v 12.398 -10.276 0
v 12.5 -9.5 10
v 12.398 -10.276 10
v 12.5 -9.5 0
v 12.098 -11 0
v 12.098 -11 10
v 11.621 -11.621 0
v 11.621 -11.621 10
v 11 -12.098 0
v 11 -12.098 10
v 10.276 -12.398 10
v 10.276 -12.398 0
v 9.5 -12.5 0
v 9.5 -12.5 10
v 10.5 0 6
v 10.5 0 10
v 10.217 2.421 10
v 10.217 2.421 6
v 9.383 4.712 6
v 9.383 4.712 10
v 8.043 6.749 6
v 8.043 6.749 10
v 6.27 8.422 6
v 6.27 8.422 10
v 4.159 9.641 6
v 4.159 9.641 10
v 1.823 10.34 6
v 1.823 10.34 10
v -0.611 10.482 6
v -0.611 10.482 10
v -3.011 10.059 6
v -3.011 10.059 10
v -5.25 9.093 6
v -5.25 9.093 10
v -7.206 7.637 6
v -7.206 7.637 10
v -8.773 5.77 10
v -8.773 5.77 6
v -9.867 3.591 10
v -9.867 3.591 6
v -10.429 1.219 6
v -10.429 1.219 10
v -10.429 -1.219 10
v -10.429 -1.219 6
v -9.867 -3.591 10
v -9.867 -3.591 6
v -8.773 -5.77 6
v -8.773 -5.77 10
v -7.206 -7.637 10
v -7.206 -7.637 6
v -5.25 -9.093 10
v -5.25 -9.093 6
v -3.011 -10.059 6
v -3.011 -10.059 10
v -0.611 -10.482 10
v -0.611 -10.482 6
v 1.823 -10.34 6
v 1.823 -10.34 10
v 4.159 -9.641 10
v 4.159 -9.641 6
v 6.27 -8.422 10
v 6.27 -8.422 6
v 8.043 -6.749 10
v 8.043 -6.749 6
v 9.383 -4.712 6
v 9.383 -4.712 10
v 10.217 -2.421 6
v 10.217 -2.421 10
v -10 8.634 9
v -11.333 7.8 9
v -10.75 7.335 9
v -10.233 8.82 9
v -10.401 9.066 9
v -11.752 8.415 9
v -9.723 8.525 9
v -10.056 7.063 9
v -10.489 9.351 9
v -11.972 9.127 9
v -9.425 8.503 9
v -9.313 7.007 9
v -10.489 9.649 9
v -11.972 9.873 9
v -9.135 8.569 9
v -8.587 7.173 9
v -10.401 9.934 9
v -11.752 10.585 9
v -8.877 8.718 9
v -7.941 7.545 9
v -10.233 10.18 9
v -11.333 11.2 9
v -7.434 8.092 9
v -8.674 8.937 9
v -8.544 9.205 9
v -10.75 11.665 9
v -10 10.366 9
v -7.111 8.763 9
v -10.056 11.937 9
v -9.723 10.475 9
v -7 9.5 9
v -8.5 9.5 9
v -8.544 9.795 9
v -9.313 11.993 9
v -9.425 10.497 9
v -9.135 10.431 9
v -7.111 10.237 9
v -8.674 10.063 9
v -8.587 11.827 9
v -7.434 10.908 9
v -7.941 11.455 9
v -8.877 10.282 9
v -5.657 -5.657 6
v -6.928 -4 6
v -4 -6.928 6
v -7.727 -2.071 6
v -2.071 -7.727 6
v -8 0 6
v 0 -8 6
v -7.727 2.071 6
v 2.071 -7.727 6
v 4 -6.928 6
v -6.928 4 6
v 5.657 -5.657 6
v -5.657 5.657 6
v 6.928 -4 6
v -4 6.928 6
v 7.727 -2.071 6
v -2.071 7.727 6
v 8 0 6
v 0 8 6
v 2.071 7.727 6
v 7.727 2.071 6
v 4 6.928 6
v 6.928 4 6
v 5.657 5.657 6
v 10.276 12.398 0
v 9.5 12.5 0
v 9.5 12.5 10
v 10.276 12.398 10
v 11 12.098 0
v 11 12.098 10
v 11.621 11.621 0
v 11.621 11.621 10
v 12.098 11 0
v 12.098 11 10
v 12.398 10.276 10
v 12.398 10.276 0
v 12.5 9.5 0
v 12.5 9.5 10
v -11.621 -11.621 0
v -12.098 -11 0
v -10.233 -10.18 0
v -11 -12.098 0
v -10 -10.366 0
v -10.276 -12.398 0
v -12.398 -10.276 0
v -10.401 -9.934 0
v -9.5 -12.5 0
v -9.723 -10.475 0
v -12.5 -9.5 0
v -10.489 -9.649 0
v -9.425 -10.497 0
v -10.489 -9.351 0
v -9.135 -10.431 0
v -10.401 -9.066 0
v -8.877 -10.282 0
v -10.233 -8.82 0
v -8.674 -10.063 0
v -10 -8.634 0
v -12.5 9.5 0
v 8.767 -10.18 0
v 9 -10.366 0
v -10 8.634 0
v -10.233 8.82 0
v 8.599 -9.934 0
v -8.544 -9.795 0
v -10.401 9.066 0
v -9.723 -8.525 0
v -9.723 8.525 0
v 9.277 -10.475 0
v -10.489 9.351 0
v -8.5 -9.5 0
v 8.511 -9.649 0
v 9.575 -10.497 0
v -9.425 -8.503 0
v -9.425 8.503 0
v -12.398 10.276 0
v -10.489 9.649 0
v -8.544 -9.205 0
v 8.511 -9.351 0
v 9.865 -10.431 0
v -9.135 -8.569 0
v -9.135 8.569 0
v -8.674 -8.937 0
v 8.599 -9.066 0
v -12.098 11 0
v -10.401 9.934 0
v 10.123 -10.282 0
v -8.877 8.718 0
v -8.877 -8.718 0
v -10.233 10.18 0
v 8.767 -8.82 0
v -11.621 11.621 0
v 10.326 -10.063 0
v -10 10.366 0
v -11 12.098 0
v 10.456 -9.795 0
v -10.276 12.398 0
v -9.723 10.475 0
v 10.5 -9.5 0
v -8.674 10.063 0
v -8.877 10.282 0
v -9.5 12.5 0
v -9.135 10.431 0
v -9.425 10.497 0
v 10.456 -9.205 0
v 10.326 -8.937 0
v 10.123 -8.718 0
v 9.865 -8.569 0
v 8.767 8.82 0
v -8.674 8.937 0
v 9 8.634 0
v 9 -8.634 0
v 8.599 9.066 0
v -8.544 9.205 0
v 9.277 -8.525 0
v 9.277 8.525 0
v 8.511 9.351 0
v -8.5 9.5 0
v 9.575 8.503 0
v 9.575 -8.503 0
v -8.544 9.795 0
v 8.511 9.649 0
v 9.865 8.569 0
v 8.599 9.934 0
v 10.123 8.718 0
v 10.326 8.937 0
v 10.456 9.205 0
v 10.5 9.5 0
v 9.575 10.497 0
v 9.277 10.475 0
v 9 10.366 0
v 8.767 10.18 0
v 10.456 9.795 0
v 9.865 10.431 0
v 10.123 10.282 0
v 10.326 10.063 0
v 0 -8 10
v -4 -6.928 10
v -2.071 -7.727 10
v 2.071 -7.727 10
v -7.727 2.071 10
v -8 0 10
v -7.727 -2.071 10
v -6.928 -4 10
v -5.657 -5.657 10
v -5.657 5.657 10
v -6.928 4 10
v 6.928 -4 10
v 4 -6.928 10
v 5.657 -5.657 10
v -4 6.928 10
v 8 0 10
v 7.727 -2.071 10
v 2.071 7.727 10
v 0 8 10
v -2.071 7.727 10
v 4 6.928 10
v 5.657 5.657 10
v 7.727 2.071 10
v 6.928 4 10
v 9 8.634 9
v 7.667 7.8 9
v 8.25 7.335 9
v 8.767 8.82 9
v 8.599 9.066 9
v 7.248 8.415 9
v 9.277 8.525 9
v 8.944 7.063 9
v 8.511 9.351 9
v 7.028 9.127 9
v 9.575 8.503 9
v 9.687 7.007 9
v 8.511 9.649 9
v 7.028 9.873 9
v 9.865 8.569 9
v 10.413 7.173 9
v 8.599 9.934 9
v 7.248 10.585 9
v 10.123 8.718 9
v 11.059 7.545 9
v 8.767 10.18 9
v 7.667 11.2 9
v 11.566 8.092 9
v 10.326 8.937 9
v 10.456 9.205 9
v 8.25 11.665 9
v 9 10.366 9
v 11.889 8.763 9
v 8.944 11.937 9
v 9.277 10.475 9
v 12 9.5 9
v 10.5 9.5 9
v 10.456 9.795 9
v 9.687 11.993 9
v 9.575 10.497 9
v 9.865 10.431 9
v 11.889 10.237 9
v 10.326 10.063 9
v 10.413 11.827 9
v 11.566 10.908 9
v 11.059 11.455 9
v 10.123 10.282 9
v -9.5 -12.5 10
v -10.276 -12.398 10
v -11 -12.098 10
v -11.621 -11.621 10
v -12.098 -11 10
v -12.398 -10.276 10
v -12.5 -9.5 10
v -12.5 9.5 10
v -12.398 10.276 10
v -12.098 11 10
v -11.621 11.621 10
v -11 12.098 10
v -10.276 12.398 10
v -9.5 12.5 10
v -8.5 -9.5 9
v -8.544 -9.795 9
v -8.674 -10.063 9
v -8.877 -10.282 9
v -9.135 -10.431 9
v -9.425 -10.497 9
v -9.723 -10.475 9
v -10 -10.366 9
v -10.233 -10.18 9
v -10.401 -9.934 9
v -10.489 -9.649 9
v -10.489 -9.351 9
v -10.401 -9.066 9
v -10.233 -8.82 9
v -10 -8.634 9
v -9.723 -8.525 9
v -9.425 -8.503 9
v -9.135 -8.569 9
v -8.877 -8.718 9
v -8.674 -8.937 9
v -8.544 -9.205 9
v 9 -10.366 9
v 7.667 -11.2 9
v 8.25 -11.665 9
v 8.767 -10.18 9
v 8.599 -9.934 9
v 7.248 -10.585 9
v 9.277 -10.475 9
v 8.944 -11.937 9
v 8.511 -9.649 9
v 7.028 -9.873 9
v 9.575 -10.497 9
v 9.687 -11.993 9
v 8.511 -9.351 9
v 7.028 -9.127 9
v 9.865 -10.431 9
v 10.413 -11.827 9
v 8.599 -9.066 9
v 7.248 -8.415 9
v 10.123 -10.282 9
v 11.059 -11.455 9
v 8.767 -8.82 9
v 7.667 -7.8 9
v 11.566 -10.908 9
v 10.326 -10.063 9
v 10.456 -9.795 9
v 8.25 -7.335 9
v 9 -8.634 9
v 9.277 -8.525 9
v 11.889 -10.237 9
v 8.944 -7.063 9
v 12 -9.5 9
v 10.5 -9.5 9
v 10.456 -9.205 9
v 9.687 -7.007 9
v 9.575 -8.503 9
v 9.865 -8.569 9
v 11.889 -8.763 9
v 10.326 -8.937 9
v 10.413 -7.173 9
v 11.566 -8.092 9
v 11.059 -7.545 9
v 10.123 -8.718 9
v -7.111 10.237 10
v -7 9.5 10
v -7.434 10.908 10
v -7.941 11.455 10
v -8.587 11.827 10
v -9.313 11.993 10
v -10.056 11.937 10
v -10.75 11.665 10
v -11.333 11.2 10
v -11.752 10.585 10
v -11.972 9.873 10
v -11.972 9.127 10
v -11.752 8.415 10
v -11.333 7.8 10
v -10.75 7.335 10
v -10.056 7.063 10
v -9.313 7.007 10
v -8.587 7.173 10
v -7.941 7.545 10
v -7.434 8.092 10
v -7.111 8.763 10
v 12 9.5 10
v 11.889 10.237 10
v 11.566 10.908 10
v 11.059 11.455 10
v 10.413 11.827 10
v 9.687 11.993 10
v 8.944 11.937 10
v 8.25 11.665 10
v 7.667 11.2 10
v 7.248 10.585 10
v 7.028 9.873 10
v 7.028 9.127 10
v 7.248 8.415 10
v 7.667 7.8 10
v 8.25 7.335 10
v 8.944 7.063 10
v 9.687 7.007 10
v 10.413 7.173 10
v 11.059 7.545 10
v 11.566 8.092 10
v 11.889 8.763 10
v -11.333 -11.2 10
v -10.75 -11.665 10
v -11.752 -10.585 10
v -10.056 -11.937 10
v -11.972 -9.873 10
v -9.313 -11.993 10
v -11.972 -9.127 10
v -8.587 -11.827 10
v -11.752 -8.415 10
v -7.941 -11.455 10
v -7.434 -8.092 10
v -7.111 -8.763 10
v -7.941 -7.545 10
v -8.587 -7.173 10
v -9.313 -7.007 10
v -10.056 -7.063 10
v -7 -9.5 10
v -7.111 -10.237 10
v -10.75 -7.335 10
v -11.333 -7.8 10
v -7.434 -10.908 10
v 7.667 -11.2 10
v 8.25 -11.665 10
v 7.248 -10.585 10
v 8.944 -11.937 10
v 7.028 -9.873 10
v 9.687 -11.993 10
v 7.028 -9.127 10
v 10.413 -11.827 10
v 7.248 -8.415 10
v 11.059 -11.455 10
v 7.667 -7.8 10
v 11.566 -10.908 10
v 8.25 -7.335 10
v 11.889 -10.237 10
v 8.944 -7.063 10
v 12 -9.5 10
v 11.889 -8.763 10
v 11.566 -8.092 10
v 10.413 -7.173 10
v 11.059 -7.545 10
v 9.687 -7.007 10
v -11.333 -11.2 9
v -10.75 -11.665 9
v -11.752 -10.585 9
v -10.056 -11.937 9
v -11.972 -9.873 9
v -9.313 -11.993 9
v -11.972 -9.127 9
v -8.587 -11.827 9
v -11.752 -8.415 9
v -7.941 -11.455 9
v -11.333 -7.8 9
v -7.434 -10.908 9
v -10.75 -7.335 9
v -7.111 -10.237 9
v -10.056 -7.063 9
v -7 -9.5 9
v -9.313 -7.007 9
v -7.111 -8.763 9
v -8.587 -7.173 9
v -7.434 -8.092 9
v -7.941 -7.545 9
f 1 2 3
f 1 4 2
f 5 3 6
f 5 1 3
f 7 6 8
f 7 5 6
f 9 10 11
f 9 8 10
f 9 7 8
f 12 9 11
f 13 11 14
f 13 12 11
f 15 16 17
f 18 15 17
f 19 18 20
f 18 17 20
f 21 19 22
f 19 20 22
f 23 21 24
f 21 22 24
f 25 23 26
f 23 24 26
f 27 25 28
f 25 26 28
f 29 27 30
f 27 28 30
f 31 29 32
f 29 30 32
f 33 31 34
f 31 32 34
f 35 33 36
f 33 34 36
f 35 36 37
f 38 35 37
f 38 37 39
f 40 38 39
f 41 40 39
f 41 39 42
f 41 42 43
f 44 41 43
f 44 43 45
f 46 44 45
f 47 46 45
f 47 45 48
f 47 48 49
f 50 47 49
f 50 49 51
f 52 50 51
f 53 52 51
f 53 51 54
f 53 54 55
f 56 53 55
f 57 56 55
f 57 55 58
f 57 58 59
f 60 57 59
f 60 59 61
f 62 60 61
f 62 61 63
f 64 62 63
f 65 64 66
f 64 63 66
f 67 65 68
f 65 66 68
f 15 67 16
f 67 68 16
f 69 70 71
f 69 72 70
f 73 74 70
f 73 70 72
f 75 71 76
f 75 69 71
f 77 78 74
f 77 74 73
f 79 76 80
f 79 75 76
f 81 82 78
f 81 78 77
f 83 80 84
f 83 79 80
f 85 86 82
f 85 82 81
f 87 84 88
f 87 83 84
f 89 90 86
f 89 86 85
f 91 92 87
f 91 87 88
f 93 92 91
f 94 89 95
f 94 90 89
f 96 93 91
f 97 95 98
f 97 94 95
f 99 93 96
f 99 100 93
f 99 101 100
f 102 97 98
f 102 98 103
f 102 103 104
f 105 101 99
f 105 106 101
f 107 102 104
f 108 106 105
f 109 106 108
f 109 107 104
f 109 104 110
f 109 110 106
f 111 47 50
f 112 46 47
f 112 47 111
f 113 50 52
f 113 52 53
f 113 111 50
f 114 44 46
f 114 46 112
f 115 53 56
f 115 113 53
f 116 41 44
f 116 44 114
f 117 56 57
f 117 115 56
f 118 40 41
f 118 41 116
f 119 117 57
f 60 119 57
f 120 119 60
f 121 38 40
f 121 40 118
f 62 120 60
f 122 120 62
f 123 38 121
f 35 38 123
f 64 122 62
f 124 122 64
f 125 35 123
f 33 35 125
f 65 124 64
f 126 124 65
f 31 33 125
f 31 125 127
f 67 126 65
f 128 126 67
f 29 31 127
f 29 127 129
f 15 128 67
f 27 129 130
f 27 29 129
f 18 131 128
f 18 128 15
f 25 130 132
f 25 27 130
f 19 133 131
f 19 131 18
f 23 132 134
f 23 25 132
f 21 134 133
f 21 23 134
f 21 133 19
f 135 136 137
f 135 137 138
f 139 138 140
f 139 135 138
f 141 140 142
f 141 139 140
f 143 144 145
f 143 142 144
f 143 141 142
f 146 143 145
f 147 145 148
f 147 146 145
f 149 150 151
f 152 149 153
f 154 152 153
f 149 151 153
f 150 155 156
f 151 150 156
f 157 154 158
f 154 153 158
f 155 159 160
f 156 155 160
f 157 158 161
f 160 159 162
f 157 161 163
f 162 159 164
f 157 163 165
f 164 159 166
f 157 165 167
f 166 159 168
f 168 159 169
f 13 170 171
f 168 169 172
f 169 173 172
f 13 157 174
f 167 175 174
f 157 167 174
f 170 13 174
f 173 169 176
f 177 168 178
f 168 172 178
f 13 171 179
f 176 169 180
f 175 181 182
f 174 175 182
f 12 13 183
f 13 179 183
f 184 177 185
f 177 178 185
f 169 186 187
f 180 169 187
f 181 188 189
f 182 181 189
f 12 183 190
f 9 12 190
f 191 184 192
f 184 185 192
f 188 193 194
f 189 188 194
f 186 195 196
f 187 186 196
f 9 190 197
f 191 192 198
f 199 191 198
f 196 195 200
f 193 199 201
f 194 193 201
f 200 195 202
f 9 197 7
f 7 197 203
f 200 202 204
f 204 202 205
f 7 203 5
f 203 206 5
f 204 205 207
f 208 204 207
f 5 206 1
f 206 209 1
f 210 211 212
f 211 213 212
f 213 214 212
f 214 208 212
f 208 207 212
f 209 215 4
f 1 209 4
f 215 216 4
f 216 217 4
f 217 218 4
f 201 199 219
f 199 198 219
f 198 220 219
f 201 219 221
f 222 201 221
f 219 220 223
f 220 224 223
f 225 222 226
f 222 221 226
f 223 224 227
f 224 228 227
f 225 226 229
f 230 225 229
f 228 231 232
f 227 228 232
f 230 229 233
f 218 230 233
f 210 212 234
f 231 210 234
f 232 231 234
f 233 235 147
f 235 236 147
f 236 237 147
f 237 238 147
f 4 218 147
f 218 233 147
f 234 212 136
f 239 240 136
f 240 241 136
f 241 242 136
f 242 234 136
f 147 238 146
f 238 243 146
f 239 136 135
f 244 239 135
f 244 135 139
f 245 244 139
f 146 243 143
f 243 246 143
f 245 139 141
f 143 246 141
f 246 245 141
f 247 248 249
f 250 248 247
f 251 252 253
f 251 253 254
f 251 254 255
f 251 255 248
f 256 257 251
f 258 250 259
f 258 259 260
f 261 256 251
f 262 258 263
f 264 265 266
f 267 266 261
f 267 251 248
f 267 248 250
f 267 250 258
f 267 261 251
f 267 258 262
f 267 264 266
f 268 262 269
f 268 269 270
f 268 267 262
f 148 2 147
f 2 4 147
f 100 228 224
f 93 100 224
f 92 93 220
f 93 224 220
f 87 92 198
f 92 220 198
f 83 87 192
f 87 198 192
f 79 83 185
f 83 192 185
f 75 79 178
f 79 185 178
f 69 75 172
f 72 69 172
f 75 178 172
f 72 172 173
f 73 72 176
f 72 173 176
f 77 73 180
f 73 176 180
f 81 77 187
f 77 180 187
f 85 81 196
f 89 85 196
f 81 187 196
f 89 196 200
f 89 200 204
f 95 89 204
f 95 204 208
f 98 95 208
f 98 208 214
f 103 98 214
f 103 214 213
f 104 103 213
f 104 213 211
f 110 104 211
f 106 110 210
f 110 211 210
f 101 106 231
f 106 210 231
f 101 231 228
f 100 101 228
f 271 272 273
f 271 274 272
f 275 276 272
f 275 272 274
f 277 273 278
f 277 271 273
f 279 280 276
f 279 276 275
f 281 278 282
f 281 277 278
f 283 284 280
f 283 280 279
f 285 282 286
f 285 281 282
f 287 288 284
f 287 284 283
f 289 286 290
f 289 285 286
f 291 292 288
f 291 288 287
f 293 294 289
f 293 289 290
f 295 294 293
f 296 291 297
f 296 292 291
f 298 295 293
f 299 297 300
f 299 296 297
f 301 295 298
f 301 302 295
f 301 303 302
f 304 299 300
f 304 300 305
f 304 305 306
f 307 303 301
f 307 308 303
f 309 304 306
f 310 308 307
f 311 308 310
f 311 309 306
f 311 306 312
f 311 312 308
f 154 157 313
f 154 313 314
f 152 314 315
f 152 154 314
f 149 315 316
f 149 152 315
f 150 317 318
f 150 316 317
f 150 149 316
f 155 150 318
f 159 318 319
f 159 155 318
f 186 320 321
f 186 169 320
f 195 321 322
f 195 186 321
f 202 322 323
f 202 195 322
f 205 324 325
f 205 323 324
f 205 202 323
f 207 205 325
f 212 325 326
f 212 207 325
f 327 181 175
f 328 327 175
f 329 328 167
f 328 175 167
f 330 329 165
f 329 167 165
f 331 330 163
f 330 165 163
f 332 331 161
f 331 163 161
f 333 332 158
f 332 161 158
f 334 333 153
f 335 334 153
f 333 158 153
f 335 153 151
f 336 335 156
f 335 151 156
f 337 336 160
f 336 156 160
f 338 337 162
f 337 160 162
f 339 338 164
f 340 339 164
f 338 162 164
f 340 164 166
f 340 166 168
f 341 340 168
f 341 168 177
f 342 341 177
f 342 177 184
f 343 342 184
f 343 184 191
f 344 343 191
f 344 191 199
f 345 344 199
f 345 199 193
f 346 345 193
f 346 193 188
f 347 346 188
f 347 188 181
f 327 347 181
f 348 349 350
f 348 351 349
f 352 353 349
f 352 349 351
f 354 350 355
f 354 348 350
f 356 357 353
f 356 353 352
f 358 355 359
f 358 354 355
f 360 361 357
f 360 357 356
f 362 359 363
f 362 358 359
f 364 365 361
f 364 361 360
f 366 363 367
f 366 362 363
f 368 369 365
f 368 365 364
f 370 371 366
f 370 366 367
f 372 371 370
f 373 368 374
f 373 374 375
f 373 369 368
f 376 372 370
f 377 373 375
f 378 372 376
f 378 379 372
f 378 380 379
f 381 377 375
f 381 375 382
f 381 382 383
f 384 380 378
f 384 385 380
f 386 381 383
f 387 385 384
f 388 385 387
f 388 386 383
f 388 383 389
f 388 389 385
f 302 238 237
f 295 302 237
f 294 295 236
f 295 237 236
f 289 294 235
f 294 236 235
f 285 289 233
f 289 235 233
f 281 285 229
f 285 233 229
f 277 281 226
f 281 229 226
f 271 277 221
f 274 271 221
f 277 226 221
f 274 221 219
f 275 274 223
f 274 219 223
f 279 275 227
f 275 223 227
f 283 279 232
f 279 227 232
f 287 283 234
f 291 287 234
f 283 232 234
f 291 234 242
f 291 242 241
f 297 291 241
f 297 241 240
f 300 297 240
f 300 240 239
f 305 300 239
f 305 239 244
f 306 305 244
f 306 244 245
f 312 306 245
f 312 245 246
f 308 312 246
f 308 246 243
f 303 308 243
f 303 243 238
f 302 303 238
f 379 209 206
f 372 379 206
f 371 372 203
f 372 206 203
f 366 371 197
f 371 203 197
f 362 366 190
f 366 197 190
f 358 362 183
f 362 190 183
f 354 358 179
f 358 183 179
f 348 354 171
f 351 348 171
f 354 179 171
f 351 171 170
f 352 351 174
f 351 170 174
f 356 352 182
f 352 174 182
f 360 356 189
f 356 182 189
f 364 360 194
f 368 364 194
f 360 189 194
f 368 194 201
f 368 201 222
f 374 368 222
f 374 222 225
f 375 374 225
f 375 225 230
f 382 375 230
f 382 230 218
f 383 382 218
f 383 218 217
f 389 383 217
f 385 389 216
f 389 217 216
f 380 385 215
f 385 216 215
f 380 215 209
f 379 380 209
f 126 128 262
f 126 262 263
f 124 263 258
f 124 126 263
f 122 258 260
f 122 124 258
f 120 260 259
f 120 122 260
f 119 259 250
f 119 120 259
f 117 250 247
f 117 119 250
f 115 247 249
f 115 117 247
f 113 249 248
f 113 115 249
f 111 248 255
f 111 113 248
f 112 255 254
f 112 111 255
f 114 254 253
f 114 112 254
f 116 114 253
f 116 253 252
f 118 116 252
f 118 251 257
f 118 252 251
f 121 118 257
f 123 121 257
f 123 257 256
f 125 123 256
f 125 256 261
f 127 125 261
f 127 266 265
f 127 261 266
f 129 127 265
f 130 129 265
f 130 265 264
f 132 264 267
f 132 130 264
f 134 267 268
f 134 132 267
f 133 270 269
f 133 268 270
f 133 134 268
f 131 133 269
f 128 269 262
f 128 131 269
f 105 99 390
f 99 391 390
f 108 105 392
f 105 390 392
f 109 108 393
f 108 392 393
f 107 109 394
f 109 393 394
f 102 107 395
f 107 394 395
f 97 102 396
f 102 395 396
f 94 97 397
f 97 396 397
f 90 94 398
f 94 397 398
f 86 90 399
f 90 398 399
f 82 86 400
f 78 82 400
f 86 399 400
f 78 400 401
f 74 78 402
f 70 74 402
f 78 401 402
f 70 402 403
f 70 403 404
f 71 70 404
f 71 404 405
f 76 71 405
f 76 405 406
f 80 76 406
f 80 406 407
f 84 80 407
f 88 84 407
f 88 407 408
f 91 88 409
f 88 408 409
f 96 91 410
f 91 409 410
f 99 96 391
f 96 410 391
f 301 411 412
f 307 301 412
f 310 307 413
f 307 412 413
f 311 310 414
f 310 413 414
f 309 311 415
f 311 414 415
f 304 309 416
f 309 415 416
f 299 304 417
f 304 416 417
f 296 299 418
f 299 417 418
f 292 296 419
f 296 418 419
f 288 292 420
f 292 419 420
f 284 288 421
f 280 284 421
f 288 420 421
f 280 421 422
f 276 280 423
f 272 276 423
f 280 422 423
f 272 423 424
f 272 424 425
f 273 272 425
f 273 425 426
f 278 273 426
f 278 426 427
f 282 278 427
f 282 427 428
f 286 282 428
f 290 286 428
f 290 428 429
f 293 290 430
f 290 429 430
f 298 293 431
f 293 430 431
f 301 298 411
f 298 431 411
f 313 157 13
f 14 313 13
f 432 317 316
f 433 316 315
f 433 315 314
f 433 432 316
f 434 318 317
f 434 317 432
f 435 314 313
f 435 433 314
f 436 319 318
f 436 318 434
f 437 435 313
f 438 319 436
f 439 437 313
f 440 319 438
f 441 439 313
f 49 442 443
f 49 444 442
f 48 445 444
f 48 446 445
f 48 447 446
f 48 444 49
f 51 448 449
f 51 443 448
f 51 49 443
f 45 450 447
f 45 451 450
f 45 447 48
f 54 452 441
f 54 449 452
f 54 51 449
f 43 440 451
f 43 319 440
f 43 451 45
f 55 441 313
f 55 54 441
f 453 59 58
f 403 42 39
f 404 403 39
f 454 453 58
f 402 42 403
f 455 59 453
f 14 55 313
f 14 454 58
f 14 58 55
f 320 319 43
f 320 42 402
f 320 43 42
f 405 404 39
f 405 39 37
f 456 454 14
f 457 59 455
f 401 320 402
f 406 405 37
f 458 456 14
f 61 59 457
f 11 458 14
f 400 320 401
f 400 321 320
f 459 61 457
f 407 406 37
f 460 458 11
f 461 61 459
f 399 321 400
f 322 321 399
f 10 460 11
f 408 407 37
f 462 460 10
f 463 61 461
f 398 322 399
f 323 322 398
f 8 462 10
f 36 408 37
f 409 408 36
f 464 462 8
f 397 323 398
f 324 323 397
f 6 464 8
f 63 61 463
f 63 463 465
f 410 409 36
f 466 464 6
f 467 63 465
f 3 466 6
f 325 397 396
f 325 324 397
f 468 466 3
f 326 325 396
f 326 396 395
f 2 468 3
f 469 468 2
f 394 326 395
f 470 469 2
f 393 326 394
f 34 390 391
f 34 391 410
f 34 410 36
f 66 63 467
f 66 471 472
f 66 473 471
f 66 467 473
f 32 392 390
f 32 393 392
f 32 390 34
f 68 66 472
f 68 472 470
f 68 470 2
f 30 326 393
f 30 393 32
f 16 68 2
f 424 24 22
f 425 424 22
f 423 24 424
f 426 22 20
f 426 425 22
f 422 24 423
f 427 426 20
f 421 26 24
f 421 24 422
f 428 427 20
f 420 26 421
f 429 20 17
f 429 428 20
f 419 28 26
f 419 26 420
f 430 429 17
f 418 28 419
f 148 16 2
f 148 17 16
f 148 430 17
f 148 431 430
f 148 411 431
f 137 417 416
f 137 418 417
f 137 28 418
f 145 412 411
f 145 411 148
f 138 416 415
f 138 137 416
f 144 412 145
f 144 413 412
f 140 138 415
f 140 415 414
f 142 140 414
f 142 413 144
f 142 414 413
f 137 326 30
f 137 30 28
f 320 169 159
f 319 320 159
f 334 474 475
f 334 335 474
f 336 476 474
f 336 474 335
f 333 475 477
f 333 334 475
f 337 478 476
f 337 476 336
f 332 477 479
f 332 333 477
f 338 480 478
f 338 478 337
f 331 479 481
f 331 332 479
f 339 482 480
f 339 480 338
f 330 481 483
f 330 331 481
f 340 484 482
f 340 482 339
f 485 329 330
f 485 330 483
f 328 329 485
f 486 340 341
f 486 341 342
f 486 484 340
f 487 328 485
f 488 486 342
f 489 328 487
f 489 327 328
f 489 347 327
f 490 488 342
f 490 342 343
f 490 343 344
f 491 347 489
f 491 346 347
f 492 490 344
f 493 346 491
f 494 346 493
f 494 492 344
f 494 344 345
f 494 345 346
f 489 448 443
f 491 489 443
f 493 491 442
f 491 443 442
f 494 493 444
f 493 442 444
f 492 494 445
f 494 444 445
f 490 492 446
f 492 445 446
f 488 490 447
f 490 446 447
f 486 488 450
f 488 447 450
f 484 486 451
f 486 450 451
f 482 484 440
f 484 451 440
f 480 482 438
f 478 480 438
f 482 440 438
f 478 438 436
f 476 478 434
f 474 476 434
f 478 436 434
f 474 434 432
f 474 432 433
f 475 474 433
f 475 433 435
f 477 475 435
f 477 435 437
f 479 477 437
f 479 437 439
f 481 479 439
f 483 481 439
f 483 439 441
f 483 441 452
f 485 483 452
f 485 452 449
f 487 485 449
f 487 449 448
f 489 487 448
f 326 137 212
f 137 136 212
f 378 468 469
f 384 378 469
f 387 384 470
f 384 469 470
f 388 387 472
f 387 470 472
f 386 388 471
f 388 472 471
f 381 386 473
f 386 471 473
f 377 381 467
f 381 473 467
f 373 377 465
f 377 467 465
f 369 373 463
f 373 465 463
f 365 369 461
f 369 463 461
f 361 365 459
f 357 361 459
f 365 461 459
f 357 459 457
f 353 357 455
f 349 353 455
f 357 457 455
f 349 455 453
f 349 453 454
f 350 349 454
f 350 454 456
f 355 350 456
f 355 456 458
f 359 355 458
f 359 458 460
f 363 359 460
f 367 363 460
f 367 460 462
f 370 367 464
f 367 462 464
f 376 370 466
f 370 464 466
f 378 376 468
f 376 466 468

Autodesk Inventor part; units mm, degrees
ref_plane "YZ Plane" through (0, 0, 0) normal (1, 0, 0) x (0, 1, 0)
ref_plane "XZ Plane" through (0, 0, 0) normal (0, 1, 0) x (-1, 0, 0)
ref_plane "XY Plane" through (0, 0, 0) normal (0, 0, 1) x (1, 0, 0)
sketch "Sketch1" plane through (0, 0, 0) normal (0, 0, 1) x (1, 0, 0)
  circle A0 centre (9.5, 9.5) radius 1 projected
  arc A1 (12.2, 7.5) -> (12.5, 7.8) centre (12.2, 7.8) ccw projected
  line L0 (12.5, 7.8) -> (12.5, 12.2) projected
  arc A2 (12.5, 12.2) -> (12.2, 12.5) centre (12.2, 12.2) ccw projected
  line L1 (12.2, 12.5) -> (7.8, 12.5) projected
  arc A3 (7.8, 12.5) -> (7.5, 12.2) centre (7.8, 12.2) ccw projected
  line L2 (7.5, 12.2) -> (7.5, 7.8) projected
  arc A4 (7.5, 7.8) -> (7.8, 7.5) centre (7.8, 7.8) ccw projected
  line L3 (7.8, 7.5) -> (12.2, 7.5) projected
  circle A5 centre (9.5, -9.5) radius 1 projected
  arc A6 (12.5, -7.8) -> (12.2, -7.5) centre (12.2, -7.8) ccw projected
  line L4 (12.2, -7.5) -> (7.8, -7.5) projected
  arc A7 (7.8, -7.5) -> (7.5, -7.8) centre (7.8, -7.8) ccw projected
  line L5 (7.5, -7.8) -> (7.5, -12.2) projected
  arc A8 (7.5, -12.2) -> (7.8, -12.5) centre (7.8, -12.2) ccw projected
  line L6 (7.8, -12.5) -> (12.2, -12.5) projected
  arc A9 (12.2, -12.5) -> (12.5, -12.2) centre (12.2, -12.2) ccw projected
  line L7 (12.5, -12.2) -> (12.5, -7.8) projected
  circle A10 centre (-9.5, -9.5) radius 1 projected
  arc A11 (-12.2, -7.5) -> (-12.5, -7.8) centre (-12.2, -7.8) ccw projected
  line L8 (-12.5, -7.8) -> (-12.5, -12.2) projected
  arc A12 (-12.5, -12.2) -> (-12.2, -12.5) centre (-12.2, -12.2) ccw projected
  line L9 (-12.2, -12.5) -> (-7.8, -12.5) projected
  arc A13 (-7.8, -12.5) -> (-7.5, -12.2) centre (-7.8, -12.2) ccw projected
  line L10 (-7.5, -12.2) -> (-7.5, -7.8) projected
  arc A14 (-7.5, -7.8) -> (-7.8, -7.5) centre (-7.8, -7.8) ccw projected
  line L11 (-7.8, -7.5) -> (-12.2, -7.5) projected
  circle A15 centre (-9.5, 9.5) radius 1 projected
  arc A16 (-12.5, 7.8) -> (-12.2, 7.5) centre (-12.2, 7.8) ccw projected
  line L12 (-12.2, 7.5) -> (-7.8, 7.5) projected
  arc A17 (-7.8, 7.5) -> (-7.5, 7.8) centre (-7.8, 7.8) ccw projected
  line L13 (-7.5, 7.8) -> (-7.5, 12.2) projected
  arc A18 (-7.5, 12.2) -> (-7.8, 12.5) centre (-7.8, 12.2) ccw projected
  line L14 (-7.8, 12.5) -> (-12.2, 12.5) projected
  arc A19 (-12.2, 12.5) -> (-12.5, 12.2) centre (-12.2, 12.2) ccw projected
  line L15 (-12.5, 12.2) -> (-12.5, 7.8) projected
  line L16 (9.5, 12.5) -> (-9.5, 12.5)
  line L17 (-12.5, 9.5) -> (-12.5, -9.5)
  line L18 (-9.5, -12.5) -> (9.5, -12.5)
  line L19 (12.5, -9.5) -> (12.5, 9.5)
  line L20 (12.5, 12.5) -> (-12.5, -12.5) construction
  line L21 (-12.5, 12.5) -> (12.5, -12.5) construction
  arc A20 (12.5, 9.5) -> (9.5, 12.5) centre (9.5, 9.5) ccw
  arc A21 (-9.5, 12.5) -> (-12.5, 9.5) centre (-9.5, 9.5) ccw
  arc A22 (-12.5, -9.5) -> (-9.5, -12.5) centre (-9.5, -9.5) ccw
  arc A23 (9.5, -12.5) -> (12.5, -9.5) centre (9.5, -9.5) ccw
  point P0 (0, 0)
  point P1 (0, 0)
  point P2 (-9.5, 12.5)
  point P3 (-12.5, -9.5)
  point P4 (-12.5, -9.5)
  dimension "d0" = 25
  dimension "d1" = 25
  dimension "d2" = 3
extrude "Extrusion1" add sketch "Sketch1" along normal blind 10 contours L3 A4 L2 A3 L1 A20 L0 A1 | A1 L19 A6 L4 A7 L5 A8 L18 A13 L10 A14 L11 A11 L17 A16 L12 A17 L13 A18 L16 A3 L2 A4 L3 | L7 A23 L6 A8 L5 A7 L4 A6 | A18 L13 A17 L12 A16 L15 A21 L14 | L9 A22 L8 A11 L11 A14 L10 A13
sketch "Sketch2" plane through (0, 0, 10) normal (0, 0, 1) x (1, 0, 0)
  circle A0 centre (0, 0) radius 10.5
  dimension "d5" = 21
extrude "Extrusion2" cut sketch "Sketch2" against normal blind 4
sketch "Sketch3" plane through (0, 0, 6) normal (0, 0, 1) x (1, 0, 0)
  circle A0 centre (0, 0) radius 8
  dimension "d8" = 16
extrude "Extrusion3" add sketch "Sketch3" along normal up to surface (4 mm away)
sketch "Sketch4" plane through (0, 0, 10) normal (0, 0, 1) x (1, 0, 0)
  circle A0 centre (9.5, -9.5) radius 1 projected
  circle A1 centre (-9.5, -9.5) radius 1 projected
  circle A2 centre (-9.5, 9.5) radius 1 projected
  circle A3 centre (9.5, 9.5) radius 1 projected
  circle A4 centre (9.5, -9.5) radius 2.5
  line L0 (-9.5, -12.5) -> (9.5, -12.5) projected
  line L1 (12.5, -9.5) -> (12.5, 9.5) projected
  circle A5 centre (-9.5, -9.5) radius 2.5
  circle A6 centre (9.5, 9.5) radius 2.5
  circle A7 centre (-9.5, 9.5) radius 2.5
  point P0 (0, 0)
  dimension "d11" = 5
  dimension "d12" = 19
  dimension "d13" = 19
  dimension "d16" = 19
  dimension "d19" = 19
extrude "Extrusion4" cut sketch "Sketch4" against normal blind 1 contours A0 | A1 | A2 | A3 | A4 | A5 | A6 | A7
equation "\"d16\" = d12"
equation "\"d19\" = d13"
properties part number "fan" material "Polyethylene, Low Density"
